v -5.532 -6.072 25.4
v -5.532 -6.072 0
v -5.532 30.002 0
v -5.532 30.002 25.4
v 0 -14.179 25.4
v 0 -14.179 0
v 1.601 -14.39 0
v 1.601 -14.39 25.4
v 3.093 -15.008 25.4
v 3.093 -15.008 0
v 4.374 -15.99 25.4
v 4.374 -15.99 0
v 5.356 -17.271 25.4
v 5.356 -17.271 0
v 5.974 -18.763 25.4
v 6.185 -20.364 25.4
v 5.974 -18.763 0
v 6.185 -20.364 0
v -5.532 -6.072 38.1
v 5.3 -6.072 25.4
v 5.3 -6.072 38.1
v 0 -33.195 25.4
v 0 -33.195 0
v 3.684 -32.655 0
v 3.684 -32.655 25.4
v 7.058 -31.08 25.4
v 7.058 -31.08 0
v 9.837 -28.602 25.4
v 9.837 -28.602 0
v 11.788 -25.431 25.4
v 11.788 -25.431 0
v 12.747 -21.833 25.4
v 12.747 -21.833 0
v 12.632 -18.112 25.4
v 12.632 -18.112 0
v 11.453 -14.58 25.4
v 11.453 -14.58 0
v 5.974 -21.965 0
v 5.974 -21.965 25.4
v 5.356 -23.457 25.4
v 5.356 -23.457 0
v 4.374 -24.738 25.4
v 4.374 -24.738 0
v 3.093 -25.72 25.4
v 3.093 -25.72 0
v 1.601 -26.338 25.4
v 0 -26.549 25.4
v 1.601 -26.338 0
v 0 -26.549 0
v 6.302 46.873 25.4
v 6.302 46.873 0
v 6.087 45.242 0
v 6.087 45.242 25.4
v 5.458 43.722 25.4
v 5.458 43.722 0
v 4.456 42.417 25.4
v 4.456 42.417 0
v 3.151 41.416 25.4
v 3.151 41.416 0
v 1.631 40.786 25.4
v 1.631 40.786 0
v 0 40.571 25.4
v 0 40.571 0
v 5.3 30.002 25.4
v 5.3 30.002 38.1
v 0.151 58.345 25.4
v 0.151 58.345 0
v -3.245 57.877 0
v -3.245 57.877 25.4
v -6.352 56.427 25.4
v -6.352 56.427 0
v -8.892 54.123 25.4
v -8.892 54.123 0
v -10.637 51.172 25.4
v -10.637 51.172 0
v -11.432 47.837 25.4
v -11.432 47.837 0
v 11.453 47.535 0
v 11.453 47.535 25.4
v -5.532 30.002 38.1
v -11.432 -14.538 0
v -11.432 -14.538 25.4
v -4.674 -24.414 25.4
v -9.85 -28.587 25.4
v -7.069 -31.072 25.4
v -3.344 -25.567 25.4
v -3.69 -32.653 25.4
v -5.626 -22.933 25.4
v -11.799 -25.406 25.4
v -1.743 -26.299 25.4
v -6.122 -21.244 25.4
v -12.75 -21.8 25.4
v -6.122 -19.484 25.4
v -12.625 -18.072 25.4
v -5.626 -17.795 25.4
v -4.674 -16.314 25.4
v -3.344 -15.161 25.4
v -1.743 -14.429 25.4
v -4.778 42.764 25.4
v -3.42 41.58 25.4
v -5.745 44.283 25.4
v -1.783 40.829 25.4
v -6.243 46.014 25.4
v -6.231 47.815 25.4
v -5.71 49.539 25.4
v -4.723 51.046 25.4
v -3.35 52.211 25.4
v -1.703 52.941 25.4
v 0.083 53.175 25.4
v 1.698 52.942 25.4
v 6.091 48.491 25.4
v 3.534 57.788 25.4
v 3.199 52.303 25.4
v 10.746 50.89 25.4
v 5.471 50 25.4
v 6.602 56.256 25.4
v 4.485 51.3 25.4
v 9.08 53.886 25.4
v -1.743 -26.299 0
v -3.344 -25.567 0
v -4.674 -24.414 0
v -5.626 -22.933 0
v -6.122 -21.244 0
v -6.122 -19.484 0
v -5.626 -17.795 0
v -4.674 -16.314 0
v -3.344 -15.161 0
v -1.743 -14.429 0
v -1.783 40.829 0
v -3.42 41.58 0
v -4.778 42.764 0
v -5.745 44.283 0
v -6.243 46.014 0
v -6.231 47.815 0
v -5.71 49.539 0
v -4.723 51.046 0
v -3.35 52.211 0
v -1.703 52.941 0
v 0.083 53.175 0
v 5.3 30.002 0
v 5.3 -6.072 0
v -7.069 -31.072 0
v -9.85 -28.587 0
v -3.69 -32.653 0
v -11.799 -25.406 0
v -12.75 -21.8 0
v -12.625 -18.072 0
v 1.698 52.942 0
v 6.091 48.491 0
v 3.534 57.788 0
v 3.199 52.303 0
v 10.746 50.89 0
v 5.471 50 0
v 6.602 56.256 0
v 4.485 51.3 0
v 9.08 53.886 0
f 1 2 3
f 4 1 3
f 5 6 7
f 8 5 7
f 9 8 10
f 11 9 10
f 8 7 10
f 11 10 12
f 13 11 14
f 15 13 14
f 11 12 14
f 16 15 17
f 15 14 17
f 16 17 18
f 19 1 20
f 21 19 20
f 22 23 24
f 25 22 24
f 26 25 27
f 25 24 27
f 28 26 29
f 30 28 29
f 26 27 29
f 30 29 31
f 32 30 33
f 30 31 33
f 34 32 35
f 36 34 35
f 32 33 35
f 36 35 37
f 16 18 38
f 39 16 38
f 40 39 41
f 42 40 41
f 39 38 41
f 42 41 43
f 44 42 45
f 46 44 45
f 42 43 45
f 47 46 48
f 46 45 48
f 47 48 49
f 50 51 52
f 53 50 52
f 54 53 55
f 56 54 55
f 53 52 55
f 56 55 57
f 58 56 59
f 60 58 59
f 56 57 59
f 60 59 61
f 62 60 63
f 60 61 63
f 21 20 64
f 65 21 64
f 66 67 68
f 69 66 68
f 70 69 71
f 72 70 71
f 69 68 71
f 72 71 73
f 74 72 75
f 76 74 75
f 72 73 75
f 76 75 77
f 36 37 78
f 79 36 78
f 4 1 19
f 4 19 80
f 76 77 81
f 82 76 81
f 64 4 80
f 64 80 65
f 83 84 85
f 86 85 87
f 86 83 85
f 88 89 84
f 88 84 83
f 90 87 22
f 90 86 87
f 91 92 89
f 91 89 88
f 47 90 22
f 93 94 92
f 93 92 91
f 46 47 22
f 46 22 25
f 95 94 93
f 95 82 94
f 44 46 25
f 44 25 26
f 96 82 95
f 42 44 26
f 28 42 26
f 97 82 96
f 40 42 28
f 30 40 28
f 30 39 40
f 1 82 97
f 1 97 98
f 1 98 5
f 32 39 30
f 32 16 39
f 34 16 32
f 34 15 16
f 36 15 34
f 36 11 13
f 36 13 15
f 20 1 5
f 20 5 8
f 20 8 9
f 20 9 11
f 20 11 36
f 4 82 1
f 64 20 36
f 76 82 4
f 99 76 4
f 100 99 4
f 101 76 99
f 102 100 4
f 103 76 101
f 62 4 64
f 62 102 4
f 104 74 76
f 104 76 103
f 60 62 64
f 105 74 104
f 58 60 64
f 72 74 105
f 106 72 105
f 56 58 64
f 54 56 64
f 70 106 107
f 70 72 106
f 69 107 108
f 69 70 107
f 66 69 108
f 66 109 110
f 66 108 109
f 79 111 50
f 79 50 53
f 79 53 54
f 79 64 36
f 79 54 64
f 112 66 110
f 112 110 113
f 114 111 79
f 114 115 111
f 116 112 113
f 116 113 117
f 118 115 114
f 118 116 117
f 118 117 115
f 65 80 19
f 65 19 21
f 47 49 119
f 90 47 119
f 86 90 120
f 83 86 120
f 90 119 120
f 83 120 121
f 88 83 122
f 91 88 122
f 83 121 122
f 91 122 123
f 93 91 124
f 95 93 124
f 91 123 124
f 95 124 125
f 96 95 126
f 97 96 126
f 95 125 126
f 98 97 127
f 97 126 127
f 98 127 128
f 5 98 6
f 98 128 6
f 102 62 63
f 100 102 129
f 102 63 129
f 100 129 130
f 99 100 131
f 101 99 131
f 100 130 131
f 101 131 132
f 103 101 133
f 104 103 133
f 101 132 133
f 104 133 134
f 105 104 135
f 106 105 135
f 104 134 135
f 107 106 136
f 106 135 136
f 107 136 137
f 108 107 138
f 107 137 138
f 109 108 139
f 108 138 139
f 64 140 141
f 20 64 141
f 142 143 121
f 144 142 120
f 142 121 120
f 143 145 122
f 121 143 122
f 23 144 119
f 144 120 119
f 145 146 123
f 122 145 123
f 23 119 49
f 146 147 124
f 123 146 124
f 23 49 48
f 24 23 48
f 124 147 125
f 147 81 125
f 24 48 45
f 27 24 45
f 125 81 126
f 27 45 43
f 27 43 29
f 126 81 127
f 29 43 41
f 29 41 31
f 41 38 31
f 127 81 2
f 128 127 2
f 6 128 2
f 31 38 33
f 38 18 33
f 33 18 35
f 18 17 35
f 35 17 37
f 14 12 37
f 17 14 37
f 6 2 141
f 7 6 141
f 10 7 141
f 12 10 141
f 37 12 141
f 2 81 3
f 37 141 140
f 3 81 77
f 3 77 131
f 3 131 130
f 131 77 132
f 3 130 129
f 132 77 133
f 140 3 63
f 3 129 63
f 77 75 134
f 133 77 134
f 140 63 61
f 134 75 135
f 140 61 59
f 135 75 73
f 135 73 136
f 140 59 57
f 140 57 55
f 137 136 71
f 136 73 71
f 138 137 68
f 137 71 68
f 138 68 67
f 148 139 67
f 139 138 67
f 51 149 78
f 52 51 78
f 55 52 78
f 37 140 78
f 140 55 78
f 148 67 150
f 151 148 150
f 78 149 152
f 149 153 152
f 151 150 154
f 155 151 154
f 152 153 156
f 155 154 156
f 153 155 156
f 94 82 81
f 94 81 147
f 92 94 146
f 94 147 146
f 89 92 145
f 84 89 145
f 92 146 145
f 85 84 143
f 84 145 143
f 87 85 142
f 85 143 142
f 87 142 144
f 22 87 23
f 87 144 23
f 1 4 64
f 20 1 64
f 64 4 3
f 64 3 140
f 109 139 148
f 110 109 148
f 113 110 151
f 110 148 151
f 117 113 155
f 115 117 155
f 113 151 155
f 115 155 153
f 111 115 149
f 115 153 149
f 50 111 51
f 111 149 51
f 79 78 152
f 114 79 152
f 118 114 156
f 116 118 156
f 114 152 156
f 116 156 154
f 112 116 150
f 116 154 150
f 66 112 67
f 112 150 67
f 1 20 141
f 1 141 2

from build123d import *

# Parameters (mm, degrees)
F1_DEPTH = 25.4
F2_W     = 10.831615
F2_H     = 36.074603
F3_DEPTH = 12.7


with BuildPart() as f1:
    # F0 (on Top) → F1 (new body)
    with BuildSketch(Plane.XY):
        with BuildLine():
            Line((11.453449, -14.580139), (11.453449, 46.211524))
            Line((11.453449, 46.211524), (11.453449, 47.535138))
            ThreePointArc((11.453449, 47.535138), (7.929655, 55.164293), (0.151163, 58.344888))
            Line((0.151163, 58.344888), (0.083036, 53.174786))
            ThreePointArc((0.083036, 53.174786), (4.48545, 51.300065), (6.302002, 46.873331))
            ThreePointArc((6.302002, 46.873331), (4.456189, 42.417143), (0, 40.571329))
            Line((0, 40.571329), (0, 30.002359))
            Line((0, 30.002359), (5.299856, 30.002359))
            Line((5.299856, 30.002359), (5.299856, -6.072244))
            Line((5.299856, -6.072244), (0, -6.072244))
            Line((0, -6.072244), (0, -14.17889))
            ThreePointArc((0, -14.17889), (4.373526, -15.990464), (6.1851, -20.36399))
            ThreePointArc((6.1851, -20.36399), (4.373526, -24.737516), (0, -26.54909))
            Line((0, -26.54909), (0, -33.194985))
            ThreePointArc((0, -33.194985), (10.928105, -27.087898), (11.453449, -14.580139))
        make_face()
        with BuildLine():
            Line((0.083036, 53.174786), (0.151163, 58.344888))
            ThreePointArc((0.151163, 58.344888), (-7.708436, 55.37036), (-11.432033, 47.836705))
            Line((-11.432033, 47.836705), (-11.432033, 45.909957))
            Line((-11.432033, 45.909957), (-11.432033, -14.537925))
            ThreePointArc((-11.432033, -14.537925), (-10.94049, -27.067728), (0, -33.194985))
            Line((0, -33.194985), (0, -26.54909))
            ThreePointArc((0, -26.54909), (-6.1851, -20.36399), (0, -14.17889))
            Line((0, -14.17889), (0, -6.072244))
            Line((0, -6.072244), (-5.531759, -6.072244))
            Line((-5.531759, -6.072244), (-5.531759, 30.002359))
            Line((-5.531759, 30.002359), (0, 30.002359))
            Line((0, 30.002359), (0, 40.571329))
            ThreePointArc((0, 40.571329), (-6.301865, 46.91485), (0.083036, 53.174786))
        make_face()
    extrude(amount=F1_DEPTH)


with BuildPart() as f3:
    # F2 (on face) → F3 (new body)
    with BuildSketch(Plane.XY.offset(25.4)):
        with Locations((-0.115951, 11.965058)):
            Rectangle(F2_W, F2_H)
    extrude(amount=F3_DEPTH)


solid = Compound([f1.part, f3.part])
